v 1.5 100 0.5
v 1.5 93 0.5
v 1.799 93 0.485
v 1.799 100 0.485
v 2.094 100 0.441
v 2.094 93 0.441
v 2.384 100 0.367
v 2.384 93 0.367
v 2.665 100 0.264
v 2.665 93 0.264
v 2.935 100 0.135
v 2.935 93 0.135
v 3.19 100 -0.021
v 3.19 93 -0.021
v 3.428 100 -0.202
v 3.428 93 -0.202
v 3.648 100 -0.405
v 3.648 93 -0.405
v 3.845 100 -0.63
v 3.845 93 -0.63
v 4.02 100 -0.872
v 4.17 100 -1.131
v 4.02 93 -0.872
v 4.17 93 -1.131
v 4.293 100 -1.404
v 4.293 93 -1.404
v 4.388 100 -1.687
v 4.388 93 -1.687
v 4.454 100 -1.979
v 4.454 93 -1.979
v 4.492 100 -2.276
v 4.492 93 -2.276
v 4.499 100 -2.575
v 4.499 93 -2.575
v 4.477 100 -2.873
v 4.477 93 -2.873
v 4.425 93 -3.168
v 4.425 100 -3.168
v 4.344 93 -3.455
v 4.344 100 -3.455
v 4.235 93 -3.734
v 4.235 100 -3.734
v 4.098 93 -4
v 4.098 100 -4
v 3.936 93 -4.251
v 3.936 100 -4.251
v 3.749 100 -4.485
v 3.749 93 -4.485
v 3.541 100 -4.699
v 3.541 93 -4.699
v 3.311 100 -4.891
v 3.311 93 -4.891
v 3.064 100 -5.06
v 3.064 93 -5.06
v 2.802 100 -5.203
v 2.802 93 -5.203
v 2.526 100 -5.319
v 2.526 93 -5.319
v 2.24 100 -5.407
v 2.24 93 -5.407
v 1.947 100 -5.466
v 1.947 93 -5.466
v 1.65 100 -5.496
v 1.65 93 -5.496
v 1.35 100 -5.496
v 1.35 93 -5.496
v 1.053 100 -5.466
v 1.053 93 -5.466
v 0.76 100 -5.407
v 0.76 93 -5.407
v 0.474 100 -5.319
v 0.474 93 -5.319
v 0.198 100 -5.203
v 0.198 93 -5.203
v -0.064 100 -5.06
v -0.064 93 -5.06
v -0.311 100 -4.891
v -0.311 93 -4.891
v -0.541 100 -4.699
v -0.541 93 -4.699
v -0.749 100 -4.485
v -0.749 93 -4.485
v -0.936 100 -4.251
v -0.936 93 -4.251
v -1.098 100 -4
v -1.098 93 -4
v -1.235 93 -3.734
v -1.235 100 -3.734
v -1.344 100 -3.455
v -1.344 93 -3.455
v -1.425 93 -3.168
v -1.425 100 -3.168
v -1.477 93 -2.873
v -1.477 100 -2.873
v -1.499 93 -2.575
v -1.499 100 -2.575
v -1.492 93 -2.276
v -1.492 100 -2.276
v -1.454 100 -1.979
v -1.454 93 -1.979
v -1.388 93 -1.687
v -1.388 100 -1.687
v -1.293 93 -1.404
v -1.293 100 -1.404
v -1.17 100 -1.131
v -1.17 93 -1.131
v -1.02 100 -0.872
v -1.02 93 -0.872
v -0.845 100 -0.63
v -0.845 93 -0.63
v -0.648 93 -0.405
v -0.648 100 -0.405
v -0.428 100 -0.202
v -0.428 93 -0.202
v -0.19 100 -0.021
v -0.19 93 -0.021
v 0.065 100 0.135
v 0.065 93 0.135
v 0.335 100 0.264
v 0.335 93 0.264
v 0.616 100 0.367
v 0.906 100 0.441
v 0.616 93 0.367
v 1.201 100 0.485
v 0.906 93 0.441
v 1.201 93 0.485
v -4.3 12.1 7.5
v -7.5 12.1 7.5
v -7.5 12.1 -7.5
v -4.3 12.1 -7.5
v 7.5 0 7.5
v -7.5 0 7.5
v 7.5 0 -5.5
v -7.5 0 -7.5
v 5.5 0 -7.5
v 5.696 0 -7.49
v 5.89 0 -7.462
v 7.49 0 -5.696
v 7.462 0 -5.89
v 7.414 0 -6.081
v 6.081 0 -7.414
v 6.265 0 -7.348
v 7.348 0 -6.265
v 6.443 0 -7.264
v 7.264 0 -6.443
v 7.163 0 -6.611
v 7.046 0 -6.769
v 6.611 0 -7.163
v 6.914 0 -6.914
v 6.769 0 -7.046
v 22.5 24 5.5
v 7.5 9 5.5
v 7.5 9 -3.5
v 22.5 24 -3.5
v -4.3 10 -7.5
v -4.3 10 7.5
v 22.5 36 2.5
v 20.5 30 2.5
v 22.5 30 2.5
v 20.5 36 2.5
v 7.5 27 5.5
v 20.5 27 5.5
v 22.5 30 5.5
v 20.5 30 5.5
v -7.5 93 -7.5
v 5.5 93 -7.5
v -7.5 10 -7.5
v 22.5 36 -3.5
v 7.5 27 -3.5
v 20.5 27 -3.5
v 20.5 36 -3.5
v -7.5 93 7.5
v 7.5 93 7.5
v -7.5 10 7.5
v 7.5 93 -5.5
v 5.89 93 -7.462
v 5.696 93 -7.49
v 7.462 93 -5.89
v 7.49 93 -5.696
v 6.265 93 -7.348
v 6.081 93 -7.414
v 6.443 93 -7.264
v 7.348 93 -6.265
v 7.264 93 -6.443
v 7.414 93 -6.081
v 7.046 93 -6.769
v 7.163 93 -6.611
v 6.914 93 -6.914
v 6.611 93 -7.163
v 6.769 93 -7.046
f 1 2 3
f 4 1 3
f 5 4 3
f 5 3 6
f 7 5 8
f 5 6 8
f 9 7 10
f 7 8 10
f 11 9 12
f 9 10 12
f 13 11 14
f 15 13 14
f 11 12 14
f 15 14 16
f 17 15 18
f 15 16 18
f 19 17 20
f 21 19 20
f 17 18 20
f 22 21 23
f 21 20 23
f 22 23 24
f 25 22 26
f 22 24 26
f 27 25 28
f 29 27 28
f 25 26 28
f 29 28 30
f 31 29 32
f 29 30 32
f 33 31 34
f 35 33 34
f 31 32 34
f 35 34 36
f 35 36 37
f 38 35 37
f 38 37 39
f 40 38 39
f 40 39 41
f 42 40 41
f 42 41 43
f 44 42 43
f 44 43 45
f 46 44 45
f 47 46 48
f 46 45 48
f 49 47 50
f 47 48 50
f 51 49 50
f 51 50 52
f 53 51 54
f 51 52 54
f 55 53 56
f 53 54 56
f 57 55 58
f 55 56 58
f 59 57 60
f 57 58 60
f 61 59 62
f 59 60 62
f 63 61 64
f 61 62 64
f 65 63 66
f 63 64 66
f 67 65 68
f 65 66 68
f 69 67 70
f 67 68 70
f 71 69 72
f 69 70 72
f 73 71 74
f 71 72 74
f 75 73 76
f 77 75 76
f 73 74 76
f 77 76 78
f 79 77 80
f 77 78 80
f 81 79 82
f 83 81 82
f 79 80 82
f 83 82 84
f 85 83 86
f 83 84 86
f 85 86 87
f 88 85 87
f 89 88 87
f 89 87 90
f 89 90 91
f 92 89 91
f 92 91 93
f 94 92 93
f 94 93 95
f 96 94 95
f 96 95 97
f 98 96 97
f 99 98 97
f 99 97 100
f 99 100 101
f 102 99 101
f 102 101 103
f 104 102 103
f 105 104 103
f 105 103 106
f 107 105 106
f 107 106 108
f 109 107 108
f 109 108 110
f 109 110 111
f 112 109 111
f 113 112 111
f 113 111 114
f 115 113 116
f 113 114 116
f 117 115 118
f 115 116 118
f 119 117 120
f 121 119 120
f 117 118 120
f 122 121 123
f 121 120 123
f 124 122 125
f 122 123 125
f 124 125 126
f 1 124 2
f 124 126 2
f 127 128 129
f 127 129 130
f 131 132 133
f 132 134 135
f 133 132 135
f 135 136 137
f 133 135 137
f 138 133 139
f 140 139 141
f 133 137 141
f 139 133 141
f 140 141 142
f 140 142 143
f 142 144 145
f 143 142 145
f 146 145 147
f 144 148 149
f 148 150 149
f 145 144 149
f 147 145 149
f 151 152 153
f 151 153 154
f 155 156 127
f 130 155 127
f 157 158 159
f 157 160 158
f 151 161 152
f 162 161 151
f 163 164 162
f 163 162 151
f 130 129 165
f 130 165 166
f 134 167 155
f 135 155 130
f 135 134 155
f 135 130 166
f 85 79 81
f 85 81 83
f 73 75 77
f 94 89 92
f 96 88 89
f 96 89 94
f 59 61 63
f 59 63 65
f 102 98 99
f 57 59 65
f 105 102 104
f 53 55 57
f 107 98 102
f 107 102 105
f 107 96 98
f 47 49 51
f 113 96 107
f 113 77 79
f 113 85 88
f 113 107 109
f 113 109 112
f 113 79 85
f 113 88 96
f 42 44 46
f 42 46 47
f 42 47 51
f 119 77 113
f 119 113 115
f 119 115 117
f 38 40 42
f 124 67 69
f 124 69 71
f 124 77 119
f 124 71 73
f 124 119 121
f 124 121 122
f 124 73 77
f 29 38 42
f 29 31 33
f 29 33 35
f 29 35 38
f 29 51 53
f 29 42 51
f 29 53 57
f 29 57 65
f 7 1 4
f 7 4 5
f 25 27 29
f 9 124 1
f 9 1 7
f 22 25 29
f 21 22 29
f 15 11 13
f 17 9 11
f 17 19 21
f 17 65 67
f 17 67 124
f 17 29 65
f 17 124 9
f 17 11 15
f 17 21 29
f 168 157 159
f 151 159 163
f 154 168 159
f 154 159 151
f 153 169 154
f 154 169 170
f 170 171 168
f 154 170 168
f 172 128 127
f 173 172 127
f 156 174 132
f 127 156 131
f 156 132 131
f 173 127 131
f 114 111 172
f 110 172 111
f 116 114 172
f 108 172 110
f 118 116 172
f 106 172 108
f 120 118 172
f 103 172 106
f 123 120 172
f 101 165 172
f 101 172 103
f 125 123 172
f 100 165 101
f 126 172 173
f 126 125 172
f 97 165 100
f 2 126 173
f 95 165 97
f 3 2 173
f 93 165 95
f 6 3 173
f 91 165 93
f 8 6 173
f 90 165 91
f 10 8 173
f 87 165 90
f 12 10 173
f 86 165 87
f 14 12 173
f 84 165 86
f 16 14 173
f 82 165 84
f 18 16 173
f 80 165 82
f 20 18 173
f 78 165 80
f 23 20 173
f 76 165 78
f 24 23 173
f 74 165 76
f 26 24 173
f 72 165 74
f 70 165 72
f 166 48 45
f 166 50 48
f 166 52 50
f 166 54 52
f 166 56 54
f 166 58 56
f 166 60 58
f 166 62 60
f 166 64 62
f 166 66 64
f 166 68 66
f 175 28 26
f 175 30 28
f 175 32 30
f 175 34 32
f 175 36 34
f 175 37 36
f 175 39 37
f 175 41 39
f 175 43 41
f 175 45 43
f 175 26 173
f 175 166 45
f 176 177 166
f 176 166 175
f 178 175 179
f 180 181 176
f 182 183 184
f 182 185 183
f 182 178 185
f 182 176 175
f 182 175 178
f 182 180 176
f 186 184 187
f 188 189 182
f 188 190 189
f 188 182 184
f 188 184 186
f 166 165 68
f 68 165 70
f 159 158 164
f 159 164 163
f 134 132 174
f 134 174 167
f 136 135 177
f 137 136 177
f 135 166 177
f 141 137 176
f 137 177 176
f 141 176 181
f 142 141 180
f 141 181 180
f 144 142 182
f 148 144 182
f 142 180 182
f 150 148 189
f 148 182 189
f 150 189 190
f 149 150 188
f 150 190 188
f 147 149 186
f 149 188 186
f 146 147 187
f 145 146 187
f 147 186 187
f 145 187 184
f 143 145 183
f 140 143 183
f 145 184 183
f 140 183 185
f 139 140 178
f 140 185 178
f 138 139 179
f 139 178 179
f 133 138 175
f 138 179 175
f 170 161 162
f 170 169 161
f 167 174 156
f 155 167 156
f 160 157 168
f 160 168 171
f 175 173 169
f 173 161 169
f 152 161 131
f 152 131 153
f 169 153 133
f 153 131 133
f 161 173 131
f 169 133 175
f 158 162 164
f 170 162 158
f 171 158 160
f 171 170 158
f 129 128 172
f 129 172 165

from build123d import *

# Parameters (mm, degrees)
SKETCH1_W           = 15
SKETCH1_H           = 15
BOSS_EXTRUDE1_DEPTH = 93
SKETCH2_R           = 3
BOSS_EXTRUDE2_DEPTH = 7
SKETCH3_W           = 3.2
SKETCH3_H           = 2.1
CUT_EXTRUDE1_DEPTH  = 102.396498953
FILLET1_R           = 2
BOSS_EXTRUDE3_START = -5
BOSS_EXTRUDE3_DEPTH = 6
BOSS_EXTRUDE4_DEPTH = 3
BOSS_EXTRUDE5_DEPTH = 9


with BuildPart() as part:
    # Sketch1 → Boss-Extrude1 (new body)
    with BuildSketch(Plane(origin=(0, 0, 0), x_dir=(1, 0, 0), z_dir=(0, 1, 0))):
        Rectangle(SKETCH1_W, SKETCH1_H)
    extrude(amount=BOSS_EXTRUDE1_DEPTH)

    # Sketch2 → Boss-Extrude2 (add)
    with BuildSketch(Plane(origin=(0, 93, 0), x_dir=(1, 0, 0), z_dir=(0, 1, 0))):
        with Locations(Location((1.5, 2.5, 0), (0, 0, 270))):
            Circle(SKETCH2_R)
    extrude(amount=BOSS_EXTRUDE2_DEPTH)

    # Sketch3 → Cut-Extrude1 (cut, through all)
    with BuildSketch(Plane.XY.offset(7.5)):
        with Locations((-5.9, 11.05)):
            Rectangle(SKETCH3_W, SKETCH3_H)
    extrude(amount=-CUT_EXTRUDE1_DEPTH, mode=Mode.SUBTRACT)

    # Fillet1
    fillet1_edges = [part.edges().sort_by_distance(p)[0] for p in [
        (7.5, 46.5, -7.5),
    ]]
    fillet(fillet1_edges, radius=FILLET1_R)

    # Sketch4 → Boss-Extrude3 (add)
    with BuildSketch(Plane.XY.offset(7.5).offset(BOSS_EXTRUDE3_START)):
        Polygon((7.5, 24), (22.5, 24), (22.5, 36), (20.5, 36), (20.5, 27), (7.5, 27), align=None)
    extrude(amount=-BOSS_EXTRUDE3_DEPTH)

    # Sketch5 → Boss-Extrude4 (add)
    with BuildSketch(Plane.XY.offset(2.5)):
        Polygon((20.5, 30), (22.5, 30), (22.5, 24), (7.5, 24), (7.5, 27), (20.5, 27), align=None)
    extrude(amount=BOSS_EXTRUDE4_DEPTH)

    # Sketch6 → Boss-Extrude5 (add)
    with BuildSketch(Plane.XY.offset(5.5)):
        Polygon((22.5, 24), (7.5, 24), (7.5, 9), align=None)
    extrude(amount=-BOSS_EXTRUDE5_DEPTH)


solid = part.part
